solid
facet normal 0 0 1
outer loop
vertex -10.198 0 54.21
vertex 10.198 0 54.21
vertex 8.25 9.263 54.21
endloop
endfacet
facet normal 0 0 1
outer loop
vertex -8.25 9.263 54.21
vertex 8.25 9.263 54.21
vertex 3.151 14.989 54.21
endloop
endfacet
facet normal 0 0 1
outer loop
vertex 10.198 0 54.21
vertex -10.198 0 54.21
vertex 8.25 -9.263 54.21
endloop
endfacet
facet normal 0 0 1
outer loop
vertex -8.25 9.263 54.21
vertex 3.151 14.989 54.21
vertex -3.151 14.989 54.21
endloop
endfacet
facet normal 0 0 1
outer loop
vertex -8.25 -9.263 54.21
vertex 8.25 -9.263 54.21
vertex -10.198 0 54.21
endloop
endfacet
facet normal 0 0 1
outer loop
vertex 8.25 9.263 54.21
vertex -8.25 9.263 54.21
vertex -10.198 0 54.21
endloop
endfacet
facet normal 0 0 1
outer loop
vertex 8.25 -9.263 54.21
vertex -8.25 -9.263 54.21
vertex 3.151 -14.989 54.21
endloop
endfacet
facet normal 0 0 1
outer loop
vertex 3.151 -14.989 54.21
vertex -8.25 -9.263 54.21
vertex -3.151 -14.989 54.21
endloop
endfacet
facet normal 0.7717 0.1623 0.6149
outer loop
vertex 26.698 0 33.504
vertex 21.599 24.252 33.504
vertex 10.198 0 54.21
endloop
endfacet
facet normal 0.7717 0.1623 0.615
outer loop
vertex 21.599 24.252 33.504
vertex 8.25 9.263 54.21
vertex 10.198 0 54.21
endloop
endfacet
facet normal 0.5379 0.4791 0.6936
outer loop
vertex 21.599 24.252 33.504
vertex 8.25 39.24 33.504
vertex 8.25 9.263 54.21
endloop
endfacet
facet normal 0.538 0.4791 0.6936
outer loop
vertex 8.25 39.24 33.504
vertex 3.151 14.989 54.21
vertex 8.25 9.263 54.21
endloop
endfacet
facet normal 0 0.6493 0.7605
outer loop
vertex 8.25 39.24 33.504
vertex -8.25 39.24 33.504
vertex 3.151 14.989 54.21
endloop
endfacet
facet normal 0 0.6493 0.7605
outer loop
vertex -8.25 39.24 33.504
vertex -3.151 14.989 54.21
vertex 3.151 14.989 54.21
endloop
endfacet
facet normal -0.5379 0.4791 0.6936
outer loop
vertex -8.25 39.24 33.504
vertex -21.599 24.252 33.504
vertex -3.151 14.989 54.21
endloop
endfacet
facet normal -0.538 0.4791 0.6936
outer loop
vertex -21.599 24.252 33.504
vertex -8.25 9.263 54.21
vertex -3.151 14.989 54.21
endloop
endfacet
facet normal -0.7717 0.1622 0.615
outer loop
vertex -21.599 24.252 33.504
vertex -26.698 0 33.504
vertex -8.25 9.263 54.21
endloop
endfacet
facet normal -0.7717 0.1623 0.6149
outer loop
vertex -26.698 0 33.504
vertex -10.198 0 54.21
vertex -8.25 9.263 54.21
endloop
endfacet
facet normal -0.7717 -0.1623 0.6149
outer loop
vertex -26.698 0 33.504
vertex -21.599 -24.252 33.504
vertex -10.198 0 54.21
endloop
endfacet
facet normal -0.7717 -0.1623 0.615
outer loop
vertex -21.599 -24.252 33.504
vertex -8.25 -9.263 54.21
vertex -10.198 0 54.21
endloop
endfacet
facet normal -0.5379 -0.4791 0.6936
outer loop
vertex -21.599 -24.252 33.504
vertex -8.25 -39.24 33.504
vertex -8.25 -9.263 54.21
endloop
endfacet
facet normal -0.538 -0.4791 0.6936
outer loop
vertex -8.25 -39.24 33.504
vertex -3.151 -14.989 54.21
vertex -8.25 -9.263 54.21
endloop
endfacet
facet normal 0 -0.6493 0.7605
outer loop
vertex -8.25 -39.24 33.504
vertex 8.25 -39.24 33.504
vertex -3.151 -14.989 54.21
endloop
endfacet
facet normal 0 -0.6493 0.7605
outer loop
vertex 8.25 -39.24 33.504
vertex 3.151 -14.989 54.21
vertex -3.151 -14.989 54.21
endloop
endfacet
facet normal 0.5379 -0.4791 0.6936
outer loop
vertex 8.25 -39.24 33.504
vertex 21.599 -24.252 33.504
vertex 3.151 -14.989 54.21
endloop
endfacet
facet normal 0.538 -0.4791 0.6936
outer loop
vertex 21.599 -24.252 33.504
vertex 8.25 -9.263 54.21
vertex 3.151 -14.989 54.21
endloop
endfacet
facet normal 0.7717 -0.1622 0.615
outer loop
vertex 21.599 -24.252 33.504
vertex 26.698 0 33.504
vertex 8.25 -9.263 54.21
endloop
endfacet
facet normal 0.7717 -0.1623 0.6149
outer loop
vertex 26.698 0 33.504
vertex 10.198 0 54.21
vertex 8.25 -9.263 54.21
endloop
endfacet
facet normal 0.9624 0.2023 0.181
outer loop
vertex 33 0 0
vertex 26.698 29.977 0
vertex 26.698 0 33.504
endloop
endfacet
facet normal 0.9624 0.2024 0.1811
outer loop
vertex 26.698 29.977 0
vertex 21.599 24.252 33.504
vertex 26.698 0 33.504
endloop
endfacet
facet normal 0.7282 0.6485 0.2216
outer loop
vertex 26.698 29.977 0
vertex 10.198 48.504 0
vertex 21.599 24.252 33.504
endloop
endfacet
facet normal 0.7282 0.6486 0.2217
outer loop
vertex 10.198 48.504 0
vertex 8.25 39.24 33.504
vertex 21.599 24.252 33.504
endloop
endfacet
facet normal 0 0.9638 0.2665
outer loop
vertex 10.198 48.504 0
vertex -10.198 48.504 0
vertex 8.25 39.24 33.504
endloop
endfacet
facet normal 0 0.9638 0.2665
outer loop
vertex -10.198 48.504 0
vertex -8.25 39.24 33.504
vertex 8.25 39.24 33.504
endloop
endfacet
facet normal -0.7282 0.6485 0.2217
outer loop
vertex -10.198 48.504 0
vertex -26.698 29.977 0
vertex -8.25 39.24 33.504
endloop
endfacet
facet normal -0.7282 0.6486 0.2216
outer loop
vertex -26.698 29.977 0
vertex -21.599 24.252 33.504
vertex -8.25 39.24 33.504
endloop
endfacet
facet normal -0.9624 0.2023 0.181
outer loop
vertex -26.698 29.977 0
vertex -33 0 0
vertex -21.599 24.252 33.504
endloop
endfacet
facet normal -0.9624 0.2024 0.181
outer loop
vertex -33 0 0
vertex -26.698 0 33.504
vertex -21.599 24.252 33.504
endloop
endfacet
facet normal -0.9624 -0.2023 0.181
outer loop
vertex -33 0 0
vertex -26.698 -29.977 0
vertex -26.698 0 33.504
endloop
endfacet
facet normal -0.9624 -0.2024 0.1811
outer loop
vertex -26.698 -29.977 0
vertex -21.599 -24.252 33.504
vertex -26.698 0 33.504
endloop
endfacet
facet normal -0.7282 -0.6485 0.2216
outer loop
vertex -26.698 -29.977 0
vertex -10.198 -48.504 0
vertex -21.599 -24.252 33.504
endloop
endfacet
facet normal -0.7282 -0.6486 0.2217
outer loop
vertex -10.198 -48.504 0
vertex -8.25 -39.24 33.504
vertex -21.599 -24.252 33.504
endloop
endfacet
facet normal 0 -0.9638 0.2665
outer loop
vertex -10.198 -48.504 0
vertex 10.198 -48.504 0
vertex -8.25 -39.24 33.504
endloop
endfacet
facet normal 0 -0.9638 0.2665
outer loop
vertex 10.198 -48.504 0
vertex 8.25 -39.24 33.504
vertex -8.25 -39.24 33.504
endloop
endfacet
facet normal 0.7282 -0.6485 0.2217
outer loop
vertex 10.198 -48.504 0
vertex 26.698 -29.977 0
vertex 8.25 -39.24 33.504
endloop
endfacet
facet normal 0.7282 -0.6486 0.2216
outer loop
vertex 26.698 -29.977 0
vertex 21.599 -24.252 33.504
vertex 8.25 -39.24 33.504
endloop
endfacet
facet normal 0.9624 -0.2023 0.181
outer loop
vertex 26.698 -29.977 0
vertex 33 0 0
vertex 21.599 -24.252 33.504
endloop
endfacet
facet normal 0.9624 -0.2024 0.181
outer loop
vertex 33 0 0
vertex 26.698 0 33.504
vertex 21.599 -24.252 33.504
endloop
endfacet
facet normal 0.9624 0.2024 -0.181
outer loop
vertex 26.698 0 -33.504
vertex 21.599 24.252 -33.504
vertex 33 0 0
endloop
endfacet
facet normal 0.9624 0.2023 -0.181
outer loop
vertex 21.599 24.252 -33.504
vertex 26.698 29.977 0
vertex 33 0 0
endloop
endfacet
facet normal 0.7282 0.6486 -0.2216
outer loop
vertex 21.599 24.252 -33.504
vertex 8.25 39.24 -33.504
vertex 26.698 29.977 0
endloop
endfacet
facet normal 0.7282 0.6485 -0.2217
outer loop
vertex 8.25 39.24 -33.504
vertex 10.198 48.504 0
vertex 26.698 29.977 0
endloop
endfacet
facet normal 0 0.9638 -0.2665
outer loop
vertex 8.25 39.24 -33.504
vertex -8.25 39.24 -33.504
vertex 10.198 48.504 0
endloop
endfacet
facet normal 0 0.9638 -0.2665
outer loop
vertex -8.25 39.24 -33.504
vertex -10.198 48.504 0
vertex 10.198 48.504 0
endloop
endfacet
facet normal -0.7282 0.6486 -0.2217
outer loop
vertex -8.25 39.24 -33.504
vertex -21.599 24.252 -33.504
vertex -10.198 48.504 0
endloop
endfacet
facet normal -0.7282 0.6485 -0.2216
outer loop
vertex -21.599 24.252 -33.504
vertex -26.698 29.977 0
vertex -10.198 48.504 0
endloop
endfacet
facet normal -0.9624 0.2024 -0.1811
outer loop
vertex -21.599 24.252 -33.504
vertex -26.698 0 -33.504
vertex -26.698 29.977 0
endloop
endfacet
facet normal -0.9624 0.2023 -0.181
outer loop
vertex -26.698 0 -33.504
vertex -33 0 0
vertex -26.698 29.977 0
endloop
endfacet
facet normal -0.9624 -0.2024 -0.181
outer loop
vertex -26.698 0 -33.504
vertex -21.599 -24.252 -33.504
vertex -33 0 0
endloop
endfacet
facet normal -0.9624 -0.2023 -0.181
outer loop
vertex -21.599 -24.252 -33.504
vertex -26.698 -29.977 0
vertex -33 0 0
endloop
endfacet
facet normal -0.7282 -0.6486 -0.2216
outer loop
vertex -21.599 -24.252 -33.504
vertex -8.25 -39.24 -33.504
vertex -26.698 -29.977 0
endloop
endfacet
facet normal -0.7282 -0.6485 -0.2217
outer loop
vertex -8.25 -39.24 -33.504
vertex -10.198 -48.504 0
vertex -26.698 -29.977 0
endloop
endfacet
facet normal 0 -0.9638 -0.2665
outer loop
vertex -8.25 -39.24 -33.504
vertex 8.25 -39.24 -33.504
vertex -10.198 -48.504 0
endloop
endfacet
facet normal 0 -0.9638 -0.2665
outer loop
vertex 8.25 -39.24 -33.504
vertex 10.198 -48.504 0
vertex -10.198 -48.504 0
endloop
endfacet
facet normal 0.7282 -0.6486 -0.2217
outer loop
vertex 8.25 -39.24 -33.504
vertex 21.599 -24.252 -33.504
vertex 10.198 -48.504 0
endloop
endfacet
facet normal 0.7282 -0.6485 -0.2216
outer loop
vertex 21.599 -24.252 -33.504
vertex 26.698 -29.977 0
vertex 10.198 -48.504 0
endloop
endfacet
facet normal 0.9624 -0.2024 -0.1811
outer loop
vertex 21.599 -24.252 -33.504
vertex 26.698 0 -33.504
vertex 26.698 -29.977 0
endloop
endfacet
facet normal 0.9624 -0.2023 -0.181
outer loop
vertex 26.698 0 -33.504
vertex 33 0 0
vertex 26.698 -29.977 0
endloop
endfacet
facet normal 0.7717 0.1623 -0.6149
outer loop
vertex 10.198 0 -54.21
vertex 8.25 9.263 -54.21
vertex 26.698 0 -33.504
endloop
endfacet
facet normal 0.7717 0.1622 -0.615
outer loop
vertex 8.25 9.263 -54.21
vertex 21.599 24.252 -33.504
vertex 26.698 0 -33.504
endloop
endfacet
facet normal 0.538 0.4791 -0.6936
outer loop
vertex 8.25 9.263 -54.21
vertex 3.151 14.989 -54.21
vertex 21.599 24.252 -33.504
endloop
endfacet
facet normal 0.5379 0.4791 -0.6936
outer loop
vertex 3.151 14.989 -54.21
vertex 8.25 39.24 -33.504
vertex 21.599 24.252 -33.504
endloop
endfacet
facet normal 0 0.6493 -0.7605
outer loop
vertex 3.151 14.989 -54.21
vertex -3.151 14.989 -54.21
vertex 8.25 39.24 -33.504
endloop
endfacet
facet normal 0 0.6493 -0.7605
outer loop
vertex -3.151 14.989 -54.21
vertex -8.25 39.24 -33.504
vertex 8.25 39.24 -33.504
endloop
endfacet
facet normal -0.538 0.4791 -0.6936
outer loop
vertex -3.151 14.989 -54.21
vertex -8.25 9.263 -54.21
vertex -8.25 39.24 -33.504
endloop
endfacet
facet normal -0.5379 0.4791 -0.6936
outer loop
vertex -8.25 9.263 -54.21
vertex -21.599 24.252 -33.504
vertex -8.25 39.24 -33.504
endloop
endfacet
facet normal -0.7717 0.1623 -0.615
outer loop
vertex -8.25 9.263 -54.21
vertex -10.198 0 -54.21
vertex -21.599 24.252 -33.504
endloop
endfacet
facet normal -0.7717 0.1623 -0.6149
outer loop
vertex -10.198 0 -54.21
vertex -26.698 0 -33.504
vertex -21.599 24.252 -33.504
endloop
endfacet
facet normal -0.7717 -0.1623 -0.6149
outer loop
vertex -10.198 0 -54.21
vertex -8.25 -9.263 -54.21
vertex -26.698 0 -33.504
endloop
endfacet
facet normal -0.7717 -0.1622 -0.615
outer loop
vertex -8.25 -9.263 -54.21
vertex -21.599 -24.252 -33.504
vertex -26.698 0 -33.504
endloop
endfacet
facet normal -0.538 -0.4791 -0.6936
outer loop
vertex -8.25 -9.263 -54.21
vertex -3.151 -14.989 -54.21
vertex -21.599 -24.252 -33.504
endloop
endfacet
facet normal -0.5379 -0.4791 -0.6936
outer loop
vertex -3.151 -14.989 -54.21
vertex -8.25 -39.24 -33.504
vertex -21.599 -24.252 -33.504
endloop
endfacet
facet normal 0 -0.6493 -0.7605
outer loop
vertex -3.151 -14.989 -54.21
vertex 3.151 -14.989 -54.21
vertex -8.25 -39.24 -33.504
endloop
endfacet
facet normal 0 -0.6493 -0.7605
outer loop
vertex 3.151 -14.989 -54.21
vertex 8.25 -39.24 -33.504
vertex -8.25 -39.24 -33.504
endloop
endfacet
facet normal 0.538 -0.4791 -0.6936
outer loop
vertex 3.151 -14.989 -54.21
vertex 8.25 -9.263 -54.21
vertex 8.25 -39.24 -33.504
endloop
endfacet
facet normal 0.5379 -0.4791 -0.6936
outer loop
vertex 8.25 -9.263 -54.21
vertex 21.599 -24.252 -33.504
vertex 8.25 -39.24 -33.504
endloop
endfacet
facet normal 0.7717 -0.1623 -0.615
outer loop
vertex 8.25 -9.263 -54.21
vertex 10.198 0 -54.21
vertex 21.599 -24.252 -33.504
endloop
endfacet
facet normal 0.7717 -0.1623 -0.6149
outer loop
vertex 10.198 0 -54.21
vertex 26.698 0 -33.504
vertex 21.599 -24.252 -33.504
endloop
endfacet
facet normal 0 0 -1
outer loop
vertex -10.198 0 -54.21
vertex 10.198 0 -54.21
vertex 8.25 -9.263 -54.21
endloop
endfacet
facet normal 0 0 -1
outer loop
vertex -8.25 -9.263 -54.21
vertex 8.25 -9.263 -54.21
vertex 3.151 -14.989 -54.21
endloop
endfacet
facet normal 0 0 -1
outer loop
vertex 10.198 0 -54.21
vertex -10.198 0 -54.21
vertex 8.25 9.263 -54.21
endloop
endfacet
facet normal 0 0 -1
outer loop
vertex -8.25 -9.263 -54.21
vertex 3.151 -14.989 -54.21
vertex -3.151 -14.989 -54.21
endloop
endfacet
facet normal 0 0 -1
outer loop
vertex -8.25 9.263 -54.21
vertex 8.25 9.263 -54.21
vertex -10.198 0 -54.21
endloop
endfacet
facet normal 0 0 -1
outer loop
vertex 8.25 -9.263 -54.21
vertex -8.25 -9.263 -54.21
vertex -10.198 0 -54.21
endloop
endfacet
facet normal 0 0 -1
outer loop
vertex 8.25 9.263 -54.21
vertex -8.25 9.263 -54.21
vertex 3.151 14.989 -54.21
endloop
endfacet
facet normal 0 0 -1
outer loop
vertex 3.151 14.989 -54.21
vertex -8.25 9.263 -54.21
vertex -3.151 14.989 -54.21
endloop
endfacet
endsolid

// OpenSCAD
// Generated by SolidPython 1.0.1 on 2020-07-29 00:46:50


scale(v = [11, 17, 19]) {
	sphere(r = 3);
}
/***********************************************
*********      SolidPython code:      **********
************************************************
 
# import packages: SolidPython
from solid import *
from solid.utils import *
from itertools import chain, combinations, permutations


class Resize:

    def __init__(self, scad_file):
        self.scad_file = scad_file
        #self.scad_file = import_scad(scad_file)
        # cone/cylinder param:
        self.r1 = 0
        self.r2 = 0
        self.h = 0
        # rectangular prism param:
        self.w = 0
        self.l = 0
        # ellipse param:
        self.r = 0

    # import OpenScad code (file name corresponds to shape)


    # classify shape + parameters
    def assign(self, param1, param2, param3):
        if self.scad_file == 'cone.scad':
            self.r1 = param1
            self.r2 = param2
            self.h = param3
        elif self.scad_file == 'cylinder.scad':
            self.r1 = param1
            self.r2 = param2
            self.h = param3
        elif self.scad_file == 'rectangularPrism.scad':
            self.h = param1
            self.l = param2
            self.w = param3
        else:
            self.r = param1
            self.h = param2

    # resize parameters
    def iterate(self):
        x = range(3, 20, 2)
        i = 1
        if self.scad_file == 'cone.scad':
            tempList = list(permutations(x, 2))
            for temp in tempList:
                param1 = temp[0]
                param2 = temp[1]
                filepath = 'produced_scad_files/' + 'cone' + str(param1) + '_' + str(param2) + '_' + '.scad'
                scad_render_to_file(cylinder(h=param1, r1=param2, r2=0), filepath)

        elif self.scad_file == 'cylinder.scad':
            tempList = list(permutations(x, 3))
            for temp in tempList:
                param1 = temp[0]
                param2 = temp[1]
                filepath = 'produced_scad_files/' + 'cylinder' + str(param1) + '_' + str(param2) + '_' + '.scad'
                scad_render_to_file(cylinder(h=param1, r1=param2, r2=param2), filepath)

        elif self.scad_file == 'rectangularPrism.scad':
            tempList = list(permutations(x, 3))
            for temp in tempList:
                param1 = temp[0]
                param2 = temp[1]
                param3 = temp[2]
                filepath = 'produced_scad_files/' + 'rectangularPrism' + str(param1) + '_' + str(param2) + '_' + str(
                    param3) + '.scad'
                scad_render_to_file(cube(size=(param1, param2, param3)), filepath)

        elif self.scad_file == 'ellipse.scad':
            tempList = list(permutations(x, 4))
            for temp in tempList:
                param1 = temp[0]
                param2 = temp[1]
                param3 = temp[2]
                param4 = temp[3]
                filepath = 'produced_scad_files/' + 'ellipse' + str(param1) + '_' + str(param2) + '_' + str(param3) + '_' + str(param4) + '.scad'
                scad_render_to_file(scale([param1, param2, param3])(sphere(r=param4)), filepath)

    def render_to_scadfile(self):
        scad_render_to_file(scad, 'example.scad') 
 
************************************************/
